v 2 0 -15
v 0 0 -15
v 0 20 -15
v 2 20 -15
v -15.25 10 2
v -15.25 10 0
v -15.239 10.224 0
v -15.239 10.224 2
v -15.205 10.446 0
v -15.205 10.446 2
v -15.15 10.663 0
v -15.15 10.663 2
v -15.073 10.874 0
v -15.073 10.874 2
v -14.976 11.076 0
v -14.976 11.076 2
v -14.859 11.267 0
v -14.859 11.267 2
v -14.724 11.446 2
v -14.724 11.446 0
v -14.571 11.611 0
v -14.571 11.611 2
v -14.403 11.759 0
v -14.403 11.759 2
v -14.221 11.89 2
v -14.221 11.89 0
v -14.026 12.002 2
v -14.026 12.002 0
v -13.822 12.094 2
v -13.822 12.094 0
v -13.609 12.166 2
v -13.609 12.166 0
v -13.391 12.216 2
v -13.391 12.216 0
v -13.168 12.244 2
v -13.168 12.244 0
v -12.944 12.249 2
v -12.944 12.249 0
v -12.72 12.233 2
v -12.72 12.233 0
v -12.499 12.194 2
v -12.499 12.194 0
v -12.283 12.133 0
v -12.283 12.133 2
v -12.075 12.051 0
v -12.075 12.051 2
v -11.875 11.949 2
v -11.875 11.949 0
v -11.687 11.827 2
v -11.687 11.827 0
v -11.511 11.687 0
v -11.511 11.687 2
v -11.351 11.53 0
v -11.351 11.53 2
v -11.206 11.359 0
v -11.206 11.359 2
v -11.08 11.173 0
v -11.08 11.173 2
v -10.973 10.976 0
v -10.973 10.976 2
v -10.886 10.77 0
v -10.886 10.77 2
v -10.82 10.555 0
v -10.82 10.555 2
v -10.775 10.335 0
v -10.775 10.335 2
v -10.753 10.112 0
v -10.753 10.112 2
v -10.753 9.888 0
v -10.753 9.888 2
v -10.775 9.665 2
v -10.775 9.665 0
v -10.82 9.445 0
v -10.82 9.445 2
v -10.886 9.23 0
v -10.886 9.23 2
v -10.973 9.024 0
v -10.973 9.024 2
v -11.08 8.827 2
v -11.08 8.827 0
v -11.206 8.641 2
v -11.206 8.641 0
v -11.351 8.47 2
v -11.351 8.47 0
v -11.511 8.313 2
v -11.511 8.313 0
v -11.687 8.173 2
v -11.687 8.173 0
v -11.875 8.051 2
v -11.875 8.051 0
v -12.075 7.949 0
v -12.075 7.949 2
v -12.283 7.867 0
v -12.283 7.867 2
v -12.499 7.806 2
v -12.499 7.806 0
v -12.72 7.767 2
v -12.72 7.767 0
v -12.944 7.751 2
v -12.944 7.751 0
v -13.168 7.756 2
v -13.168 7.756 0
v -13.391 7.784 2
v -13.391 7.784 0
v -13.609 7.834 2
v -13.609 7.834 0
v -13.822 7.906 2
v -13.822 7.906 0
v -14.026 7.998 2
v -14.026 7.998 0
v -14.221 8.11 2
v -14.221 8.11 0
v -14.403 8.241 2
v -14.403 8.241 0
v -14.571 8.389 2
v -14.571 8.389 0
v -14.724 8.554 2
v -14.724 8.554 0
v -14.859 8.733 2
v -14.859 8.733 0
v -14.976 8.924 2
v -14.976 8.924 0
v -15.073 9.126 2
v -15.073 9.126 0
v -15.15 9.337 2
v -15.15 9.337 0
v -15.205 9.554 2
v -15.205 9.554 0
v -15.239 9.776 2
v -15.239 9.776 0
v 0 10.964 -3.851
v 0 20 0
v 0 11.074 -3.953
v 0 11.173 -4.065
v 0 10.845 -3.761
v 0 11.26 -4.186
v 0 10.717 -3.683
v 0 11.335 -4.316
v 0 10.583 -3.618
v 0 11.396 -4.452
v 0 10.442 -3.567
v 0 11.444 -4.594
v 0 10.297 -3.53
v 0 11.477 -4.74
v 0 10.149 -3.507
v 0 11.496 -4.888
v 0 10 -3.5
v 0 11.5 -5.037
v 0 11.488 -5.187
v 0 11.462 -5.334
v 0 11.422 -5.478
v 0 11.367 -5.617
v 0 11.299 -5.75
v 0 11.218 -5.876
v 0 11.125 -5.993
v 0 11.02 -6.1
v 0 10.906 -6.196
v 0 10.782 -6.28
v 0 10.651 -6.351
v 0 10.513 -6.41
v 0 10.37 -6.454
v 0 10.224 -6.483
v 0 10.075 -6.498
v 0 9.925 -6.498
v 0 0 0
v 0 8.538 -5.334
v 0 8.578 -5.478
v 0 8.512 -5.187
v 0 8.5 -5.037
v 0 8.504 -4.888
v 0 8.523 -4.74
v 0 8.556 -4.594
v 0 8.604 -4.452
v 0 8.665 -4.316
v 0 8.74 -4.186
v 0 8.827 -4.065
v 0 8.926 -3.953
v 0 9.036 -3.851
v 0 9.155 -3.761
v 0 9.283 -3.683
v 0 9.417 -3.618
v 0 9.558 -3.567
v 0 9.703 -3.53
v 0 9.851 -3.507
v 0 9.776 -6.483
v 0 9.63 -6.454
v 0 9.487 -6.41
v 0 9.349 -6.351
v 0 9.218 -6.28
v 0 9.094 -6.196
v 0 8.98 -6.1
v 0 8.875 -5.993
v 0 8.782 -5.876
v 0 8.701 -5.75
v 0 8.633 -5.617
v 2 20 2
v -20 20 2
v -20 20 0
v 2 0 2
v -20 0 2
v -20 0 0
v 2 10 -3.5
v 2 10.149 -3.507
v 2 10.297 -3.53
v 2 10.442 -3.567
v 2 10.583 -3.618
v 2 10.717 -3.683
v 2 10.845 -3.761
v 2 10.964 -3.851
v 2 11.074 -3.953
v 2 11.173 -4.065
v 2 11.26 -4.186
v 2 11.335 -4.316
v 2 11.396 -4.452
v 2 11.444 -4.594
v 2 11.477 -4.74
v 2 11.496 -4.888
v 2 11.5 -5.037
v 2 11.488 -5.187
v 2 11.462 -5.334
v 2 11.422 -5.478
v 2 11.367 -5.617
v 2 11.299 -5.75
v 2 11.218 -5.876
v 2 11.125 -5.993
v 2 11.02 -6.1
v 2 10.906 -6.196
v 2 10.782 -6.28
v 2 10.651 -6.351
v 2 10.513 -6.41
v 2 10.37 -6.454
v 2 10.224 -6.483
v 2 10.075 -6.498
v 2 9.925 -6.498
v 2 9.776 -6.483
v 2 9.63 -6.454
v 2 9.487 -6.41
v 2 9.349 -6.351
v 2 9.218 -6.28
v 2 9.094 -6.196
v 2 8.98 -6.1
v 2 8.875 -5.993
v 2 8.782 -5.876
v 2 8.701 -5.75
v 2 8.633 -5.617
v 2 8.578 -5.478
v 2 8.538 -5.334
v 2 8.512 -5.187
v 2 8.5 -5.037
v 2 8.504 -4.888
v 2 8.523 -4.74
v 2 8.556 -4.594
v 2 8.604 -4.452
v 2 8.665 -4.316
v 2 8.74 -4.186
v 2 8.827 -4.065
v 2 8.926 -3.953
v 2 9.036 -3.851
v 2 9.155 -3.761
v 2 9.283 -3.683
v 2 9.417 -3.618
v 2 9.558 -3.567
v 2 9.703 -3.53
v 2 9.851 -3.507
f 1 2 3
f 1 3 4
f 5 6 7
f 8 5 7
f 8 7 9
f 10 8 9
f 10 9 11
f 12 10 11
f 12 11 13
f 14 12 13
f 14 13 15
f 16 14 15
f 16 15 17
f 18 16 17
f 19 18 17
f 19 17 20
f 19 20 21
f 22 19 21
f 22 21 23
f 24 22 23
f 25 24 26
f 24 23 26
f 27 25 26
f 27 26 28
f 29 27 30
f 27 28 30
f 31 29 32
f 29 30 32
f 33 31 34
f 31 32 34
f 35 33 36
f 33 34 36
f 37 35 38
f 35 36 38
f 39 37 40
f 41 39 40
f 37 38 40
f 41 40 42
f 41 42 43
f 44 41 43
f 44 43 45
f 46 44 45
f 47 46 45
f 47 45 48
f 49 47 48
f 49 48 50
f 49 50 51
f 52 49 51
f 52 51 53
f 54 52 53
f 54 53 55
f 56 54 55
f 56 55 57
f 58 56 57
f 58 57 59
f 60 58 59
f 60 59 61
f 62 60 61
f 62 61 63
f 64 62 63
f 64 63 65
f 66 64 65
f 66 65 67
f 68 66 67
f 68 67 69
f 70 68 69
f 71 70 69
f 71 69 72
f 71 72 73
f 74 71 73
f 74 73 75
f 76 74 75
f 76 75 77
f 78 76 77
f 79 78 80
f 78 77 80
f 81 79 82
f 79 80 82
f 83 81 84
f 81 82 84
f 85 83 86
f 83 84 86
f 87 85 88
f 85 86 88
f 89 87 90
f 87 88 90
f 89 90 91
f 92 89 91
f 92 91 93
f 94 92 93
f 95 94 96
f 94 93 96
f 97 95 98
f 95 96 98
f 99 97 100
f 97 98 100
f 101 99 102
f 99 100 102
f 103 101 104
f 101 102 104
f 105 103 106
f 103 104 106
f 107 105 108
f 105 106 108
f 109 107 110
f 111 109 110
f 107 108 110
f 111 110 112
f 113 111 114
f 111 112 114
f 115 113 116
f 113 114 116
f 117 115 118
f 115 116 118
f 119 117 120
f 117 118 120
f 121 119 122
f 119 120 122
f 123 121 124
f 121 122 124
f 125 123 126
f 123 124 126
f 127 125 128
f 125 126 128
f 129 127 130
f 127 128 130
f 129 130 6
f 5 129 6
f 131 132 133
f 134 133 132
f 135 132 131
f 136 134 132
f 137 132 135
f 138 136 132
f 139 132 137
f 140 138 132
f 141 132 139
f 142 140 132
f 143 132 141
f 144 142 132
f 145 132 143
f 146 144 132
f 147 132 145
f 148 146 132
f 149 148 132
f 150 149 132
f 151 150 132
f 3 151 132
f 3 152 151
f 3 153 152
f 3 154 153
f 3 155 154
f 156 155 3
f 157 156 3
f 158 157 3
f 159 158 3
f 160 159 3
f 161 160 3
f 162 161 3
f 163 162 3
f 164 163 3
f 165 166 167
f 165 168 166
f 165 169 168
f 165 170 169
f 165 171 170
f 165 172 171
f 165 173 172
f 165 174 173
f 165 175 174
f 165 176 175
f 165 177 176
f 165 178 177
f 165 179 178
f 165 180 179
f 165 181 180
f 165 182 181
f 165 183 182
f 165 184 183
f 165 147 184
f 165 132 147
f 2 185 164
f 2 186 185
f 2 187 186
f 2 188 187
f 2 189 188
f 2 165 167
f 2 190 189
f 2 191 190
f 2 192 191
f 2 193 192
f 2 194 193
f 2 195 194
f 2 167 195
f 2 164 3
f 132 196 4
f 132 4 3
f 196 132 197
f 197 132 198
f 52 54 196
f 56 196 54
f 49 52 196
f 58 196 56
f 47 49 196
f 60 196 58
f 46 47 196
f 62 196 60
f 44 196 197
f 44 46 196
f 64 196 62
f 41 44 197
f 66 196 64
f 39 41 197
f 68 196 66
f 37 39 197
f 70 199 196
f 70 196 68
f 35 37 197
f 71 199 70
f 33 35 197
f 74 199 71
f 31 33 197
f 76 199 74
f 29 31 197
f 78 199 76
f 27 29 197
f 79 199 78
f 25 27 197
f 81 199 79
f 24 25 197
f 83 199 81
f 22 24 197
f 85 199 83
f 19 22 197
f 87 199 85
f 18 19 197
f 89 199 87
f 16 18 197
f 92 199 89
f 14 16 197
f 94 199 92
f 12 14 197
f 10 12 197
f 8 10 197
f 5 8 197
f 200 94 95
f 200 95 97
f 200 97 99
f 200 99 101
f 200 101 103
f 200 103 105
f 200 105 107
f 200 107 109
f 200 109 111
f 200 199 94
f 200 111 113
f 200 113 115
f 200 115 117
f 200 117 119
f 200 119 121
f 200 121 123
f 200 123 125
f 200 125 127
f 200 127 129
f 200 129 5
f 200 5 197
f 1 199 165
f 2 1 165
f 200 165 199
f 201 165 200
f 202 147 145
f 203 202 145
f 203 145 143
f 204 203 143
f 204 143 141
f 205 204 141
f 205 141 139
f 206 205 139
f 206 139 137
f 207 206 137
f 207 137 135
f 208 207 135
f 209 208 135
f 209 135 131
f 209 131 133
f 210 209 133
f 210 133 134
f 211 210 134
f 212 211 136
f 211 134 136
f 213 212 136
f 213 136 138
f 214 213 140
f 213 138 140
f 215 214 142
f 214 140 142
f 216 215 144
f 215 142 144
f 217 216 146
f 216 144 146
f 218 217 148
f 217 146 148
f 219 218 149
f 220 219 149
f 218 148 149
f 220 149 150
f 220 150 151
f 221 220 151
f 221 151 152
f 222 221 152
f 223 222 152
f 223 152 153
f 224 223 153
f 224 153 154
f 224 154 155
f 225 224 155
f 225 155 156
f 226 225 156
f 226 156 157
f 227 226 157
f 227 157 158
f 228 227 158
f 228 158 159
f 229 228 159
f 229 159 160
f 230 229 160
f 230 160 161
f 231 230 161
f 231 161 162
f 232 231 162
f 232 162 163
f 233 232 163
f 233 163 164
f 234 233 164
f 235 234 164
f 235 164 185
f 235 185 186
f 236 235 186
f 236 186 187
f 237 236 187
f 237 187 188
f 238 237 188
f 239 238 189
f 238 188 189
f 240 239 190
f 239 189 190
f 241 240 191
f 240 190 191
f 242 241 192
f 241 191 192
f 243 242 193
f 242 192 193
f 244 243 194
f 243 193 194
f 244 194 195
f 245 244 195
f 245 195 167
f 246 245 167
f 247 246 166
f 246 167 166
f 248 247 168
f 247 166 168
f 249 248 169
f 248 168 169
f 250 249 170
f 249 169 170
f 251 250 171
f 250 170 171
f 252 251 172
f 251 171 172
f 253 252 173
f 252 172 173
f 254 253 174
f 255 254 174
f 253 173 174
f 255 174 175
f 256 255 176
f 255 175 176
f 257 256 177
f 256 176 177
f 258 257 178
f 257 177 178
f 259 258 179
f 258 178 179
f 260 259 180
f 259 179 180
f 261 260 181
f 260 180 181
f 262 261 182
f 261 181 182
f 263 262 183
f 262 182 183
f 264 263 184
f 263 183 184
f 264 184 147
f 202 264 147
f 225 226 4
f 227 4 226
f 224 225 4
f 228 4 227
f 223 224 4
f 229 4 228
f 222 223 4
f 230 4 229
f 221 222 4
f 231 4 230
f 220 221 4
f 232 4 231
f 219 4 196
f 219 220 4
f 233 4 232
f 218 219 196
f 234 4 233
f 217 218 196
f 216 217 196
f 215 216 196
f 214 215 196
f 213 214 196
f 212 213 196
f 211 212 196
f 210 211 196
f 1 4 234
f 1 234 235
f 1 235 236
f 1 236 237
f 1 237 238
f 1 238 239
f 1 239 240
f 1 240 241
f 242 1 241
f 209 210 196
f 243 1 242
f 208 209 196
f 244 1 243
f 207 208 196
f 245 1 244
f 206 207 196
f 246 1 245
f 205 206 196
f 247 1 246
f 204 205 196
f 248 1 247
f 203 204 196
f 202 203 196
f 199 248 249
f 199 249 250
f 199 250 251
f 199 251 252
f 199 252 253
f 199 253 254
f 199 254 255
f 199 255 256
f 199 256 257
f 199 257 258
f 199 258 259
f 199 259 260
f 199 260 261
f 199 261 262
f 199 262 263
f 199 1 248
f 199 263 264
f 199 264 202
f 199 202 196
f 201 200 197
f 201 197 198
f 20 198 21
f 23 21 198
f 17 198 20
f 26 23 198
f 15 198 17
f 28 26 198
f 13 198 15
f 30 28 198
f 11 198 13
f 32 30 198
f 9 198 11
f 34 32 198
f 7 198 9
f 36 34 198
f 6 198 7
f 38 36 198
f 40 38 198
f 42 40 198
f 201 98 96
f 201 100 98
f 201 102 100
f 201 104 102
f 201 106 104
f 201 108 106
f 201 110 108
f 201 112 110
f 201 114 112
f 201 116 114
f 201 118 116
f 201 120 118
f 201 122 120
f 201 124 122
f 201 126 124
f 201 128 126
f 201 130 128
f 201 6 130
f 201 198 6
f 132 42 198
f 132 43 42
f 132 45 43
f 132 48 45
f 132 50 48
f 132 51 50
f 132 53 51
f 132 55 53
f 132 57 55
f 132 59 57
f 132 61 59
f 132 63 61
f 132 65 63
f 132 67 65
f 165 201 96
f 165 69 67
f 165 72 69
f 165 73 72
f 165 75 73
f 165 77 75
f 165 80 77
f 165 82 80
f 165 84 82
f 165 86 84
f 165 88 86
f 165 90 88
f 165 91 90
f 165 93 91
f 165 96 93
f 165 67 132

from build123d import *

# Parameters (mm, degrees)
BOSS_EXTRUDE1_DEPTH = 20
SKETCH3_R           = 2.25
CUT_EXTRUDE1_DEPTH  = 33.015621187
SKETCH4_R           = 1.5
CUT_EXTRUDE2_DEPTH  = 33.015621187


with BuildPart() as part:
    # Sketch2 → Boss-Extrude1 (new body)
    with BuildSketch(Plane(origin=(0, 0, 0), x_dir=(1, 0, 0), z_dir=(0, 1, 0))):
        Polygon((-20, 0), (0, 0), (0, 15), (2, 15), (2, -2), (-20, -2), align=None)
    extrude(amount=BOSS_EXTRUDE1_DEPTH)

    # Sketch3 → Cut-Extrude1 (cut, through all)
    with BuildSketch(Plane(origin=(0, 0, 0), x_dir=(-1, 0, 0), z_dir=(0, 0, -1))):
        with Locations((13, 10)):
            Circle(SKETCH3_R)
    extrude(amount=-CUT_EXTRUDE1_DEPTH, mode=Mode.SUBTRACT)

    # Sketch4 → Cut-Extrude2 (cut, through all)
    with BuildSketch(Plane.ZY):
        with Locations((-5, 10)):
            Circle(SKETCH4_R)
    extrude(amount=-CUT_EXTRUDE2_DEPTH, mode=Mode.SUBTRACT)


solid = part.part
